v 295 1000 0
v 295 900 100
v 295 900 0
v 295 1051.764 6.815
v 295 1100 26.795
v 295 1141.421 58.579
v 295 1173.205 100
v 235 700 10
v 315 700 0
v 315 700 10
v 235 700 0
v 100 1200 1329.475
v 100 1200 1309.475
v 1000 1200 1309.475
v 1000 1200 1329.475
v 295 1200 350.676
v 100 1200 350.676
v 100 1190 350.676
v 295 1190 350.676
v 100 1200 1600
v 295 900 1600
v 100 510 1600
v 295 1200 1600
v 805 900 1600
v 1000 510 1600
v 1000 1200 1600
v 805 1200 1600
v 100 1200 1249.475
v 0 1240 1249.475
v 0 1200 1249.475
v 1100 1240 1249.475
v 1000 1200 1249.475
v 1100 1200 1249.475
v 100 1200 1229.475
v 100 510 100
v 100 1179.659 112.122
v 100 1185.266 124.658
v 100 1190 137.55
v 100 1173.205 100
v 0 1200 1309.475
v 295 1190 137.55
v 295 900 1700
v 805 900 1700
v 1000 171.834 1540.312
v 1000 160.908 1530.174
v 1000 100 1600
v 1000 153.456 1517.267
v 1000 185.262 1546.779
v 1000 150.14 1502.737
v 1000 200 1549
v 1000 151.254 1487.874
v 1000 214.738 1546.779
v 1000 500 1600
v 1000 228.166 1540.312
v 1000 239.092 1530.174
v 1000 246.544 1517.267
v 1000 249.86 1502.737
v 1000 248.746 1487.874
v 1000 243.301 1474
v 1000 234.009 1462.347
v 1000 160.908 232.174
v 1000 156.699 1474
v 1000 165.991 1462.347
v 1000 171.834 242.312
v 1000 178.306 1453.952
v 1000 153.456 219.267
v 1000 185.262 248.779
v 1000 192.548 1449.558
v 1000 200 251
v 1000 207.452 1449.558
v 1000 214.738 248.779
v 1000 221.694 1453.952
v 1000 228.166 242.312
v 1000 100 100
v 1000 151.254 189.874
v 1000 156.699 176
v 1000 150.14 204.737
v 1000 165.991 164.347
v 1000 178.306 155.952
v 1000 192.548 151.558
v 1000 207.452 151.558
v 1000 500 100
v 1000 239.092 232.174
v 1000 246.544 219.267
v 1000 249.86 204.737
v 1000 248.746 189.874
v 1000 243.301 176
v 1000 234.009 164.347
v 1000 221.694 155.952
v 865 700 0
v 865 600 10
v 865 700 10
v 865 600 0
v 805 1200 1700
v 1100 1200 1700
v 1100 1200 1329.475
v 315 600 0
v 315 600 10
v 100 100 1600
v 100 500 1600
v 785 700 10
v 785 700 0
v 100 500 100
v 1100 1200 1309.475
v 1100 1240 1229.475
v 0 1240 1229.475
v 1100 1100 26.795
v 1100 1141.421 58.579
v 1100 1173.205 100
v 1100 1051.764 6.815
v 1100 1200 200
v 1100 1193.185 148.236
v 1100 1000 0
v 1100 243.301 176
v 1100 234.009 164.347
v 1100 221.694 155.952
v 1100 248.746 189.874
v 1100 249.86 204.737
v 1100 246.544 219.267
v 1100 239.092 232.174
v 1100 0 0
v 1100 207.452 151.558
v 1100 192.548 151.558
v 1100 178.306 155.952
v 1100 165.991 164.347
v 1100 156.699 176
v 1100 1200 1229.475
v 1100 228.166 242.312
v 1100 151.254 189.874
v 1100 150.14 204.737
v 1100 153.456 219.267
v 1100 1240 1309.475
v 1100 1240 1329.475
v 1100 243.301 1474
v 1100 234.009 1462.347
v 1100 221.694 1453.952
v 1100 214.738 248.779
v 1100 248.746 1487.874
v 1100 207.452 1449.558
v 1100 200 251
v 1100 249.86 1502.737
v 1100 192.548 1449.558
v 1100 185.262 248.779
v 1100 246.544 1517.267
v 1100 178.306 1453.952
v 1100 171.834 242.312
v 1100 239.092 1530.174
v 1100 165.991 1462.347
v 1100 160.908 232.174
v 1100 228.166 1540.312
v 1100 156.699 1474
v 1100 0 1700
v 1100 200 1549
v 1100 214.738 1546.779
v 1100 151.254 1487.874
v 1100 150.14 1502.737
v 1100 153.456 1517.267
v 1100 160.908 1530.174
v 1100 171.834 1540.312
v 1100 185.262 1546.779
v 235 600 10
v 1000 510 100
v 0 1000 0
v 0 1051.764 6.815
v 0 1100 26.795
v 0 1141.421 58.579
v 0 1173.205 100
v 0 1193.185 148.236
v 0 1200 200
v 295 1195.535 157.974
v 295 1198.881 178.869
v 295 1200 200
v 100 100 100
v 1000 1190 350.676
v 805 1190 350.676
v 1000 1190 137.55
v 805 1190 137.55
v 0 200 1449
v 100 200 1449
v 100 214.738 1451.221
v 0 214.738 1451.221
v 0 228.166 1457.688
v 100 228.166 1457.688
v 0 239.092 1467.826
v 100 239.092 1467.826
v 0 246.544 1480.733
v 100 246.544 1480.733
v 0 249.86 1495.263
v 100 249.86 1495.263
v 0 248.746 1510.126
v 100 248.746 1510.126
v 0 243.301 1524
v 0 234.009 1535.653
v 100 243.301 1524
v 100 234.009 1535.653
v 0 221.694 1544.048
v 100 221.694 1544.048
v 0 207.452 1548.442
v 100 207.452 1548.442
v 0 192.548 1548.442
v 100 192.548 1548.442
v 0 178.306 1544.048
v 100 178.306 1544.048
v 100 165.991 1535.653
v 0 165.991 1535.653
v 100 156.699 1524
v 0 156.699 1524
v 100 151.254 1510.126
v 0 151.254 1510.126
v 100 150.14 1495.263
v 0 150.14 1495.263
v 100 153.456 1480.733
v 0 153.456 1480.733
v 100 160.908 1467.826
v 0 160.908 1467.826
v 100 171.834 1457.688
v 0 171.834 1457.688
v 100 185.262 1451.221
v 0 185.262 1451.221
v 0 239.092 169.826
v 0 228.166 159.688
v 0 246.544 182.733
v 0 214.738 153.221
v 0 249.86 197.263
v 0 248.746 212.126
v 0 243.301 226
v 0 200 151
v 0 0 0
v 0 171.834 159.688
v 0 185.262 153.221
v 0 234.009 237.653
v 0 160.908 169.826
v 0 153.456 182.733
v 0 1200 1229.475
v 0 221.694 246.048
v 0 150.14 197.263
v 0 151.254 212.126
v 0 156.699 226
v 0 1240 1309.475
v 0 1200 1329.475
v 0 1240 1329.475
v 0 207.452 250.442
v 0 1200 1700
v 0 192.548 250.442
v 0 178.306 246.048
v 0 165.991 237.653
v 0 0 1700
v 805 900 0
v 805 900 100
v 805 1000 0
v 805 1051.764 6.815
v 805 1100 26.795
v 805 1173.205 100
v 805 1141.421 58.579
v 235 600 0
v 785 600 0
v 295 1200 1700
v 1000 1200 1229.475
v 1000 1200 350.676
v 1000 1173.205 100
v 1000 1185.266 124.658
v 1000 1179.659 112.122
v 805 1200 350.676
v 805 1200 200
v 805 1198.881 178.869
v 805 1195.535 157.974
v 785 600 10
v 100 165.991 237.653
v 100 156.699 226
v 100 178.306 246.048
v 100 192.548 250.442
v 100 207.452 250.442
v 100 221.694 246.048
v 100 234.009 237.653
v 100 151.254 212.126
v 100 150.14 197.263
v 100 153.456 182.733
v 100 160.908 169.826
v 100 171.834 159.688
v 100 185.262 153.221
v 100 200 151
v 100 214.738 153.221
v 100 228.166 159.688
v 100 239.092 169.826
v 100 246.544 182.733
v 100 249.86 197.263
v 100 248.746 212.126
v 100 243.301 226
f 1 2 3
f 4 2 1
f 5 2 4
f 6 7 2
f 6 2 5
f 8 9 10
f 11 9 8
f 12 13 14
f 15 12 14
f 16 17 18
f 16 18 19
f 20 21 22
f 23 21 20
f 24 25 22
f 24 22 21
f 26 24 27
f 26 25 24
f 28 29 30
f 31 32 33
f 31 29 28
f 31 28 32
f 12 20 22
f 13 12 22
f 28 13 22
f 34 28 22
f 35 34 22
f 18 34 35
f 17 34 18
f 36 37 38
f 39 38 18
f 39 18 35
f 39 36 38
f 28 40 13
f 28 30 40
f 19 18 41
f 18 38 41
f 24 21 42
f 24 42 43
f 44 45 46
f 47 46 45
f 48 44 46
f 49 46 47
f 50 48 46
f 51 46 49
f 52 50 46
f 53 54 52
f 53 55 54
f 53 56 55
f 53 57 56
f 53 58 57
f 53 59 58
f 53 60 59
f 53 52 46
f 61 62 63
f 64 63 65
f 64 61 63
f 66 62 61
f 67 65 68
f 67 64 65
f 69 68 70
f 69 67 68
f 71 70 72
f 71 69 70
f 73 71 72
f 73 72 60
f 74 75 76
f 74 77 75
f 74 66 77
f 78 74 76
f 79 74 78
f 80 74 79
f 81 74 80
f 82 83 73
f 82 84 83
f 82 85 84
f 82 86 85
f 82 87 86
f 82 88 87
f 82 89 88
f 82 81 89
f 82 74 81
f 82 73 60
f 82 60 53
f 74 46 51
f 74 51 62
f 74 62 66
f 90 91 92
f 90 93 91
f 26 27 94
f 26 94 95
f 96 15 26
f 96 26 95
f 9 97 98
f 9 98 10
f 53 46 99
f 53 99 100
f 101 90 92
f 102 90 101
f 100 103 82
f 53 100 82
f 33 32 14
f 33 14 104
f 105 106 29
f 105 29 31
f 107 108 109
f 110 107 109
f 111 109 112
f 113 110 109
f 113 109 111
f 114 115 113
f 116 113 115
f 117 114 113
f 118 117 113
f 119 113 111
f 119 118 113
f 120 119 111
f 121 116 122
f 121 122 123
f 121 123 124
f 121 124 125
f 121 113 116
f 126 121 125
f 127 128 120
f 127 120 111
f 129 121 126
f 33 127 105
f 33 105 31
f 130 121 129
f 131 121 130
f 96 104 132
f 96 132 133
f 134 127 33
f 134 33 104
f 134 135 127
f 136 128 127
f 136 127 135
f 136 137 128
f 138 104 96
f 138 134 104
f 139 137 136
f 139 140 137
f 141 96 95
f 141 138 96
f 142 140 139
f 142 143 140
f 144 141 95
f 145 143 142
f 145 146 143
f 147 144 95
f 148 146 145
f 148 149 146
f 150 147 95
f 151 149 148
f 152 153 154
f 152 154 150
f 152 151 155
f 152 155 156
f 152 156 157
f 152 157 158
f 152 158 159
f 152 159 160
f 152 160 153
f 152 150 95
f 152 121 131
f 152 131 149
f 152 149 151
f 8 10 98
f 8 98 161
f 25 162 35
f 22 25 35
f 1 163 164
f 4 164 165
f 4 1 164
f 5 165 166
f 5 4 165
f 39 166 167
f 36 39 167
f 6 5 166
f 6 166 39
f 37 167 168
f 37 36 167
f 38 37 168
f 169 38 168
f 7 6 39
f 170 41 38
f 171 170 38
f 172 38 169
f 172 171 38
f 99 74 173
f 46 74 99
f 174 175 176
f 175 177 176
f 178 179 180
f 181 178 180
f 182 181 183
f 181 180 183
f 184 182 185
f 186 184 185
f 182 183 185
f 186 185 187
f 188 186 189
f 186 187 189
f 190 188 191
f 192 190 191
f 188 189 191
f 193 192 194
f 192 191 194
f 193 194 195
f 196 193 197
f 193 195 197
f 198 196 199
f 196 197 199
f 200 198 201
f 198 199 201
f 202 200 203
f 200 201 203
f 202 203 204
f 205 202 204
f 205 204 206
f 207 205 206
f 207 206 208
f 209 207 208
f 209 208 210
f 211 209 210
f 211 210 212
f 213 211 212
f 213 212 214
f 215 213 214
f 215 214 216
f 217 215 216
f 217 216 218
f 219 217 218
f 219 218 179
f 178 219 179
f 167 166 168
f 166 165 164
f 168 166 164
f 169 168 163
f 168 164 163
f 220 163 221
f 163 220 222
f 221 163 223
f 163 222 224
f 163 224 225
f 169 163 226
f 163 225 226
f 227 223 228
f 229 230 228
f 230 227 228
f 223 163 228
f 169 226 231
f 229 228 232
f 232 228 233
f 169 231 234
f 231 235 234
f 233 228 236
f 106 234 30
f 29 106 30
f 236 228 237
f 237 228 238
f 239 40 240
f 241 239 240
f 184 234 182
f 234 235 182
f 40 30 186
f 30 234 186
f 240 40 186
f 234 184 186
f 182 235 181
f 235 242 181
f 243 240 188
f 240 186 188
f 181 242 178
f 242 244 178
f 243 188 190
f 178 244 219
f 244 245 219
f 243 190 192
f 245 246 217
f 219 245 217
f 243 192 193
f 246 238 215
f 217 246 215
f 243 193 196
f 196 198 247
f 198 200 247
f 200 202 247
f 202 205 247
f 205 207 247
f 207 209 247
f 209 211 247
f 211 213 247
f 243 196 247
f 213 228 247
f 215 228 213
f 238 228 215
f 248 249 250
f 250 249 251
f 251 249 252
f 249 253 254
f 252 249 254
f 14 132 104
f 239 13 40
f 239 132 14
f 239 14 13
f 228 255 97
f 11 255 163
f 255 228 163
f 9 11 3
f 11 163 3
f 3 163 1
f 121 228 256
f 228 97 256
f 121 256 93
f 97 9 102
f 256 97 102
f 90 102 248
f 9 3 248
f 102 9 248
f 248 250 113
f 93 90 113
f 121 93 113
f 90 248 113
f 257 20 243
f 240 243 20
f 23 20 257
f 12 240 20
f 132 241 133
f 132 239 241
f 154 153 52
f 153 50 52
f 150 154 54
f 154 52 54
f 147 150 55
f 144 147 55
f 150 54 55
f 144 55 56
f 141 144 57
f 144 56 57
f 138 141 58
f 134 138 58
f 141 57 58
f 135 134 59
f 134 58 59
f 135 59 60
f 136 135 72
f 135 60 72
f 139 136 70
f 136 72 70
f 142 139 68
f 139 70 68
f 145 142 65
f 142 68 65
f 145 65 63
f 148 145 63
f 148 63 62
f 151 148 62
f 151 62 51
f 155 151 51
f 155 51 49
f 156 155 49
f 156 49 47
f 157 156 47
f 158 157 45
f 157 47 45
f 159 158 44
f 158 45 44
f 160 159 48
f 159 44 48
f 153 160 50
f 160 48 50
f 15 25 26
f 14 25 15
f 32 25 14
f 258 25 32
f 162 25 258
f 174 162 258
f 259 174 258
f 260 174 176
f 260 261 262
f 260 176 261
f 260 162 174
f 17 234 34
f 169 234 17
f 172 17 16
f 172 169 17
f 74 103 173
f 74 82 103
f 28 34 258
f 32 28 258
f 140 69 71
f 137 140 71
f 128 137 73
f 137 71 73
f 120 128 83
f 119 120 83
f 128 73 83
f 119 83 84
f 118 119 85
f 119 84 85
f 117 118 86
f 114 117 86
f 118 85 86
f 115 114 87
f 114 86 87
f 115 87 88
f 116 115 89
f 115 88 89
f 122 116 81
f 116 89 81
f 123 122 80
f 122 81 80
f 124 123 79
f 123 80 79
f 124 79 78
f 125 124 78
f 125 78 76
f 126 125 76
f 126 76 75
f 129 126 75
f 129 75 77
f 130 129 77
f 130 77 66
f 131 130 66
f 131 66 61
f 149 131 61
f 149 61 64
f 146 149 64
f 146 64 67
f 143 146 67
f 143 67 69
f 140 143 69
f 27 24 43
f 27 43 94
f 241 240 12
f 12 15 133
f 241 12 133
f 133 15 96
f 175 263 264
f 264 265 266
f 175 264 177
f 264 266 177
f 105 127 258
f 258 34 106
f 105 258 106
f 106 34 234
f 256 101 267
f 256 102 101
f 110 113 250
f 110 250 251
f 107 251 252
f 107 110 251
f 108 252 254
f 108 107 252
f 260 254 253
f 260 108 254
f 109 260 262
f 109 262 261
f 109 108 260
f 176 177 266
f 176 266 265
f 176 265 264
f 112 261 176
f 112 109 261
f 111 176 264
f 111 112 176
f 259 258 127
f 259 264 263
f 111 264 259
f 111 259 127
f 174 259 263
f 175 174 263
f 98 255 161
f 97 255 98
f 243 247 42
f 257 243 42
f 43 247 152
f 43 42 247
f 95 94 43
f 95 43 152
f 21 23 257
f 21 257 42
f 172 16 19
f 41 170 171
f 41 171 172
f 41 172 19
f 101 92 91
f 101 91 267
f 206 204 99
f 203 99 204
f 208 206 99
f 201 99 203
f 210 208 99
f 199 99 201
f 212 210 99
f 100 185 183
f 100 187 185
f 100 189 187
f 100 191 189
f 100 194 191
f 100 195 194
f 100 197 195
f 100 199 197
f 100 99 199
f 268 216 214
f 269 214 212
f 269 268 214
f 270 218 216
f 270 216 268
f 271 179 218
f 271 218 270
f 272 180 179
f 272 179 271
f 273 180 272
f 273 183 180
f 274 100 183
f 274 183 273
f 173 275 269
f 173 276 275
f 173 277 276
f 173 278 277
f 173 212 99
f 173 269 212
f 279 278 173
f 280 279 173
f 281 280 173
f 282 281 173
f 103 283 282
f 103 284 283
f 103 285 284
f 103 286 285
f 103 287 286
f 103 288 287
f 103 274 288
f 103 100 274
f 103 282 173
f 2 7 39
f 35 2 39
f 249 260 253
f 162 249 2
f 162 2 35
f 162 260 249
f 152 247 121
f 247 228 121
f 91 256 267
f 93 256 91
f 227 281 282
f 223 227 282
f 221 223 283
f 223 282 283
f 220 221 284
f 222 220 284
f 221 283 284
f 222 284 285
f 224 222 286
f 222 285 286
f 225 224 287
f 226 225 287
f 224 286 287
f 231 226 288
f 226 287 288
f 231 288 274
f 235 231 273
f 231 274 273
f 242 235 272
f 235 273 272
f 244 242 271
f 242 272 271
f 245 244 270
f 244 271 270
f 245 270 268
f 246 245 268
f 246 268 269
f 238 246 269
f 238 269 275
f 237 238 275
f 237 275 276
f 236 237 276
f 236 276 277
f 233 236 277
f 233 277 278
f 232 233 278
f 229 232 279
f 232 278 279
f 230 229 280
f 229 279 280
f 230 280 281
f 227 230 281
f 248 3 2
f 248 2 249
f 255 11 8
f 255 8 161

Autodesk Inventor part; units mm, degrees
ref_plane "YZ Plane" through (0, 0, 0) normal (1, 0, 0) x (0, 1, 0)
ref_plane "XZ Plane" through (0, 0, 0) normal (0, 1, 0) x (-1, 0, 0)
ref_plane "XY Plane" through (0, 0, 0) normal (0, 0, 1) x (1, 0, 0)
sketch "Sketch10" plane through (0, 0, 0) normal (0, 1, 0) x (-1, 0, 0)
  point P0 (0, 0)
sketch "Sketch11" plane through (0, 0, 0) normal (0, 0, 1) x (1, 0, 0)
  point P0 (0, 0)
sketch "Sketch12" plane through (0, 0, 0) normal (0, 0, 1) x (1, 0, 0)
  line L0 (0, 0) -> (1100, 0)
  line L1 (1100, 0) -> (1100, 1200)
  line L2 (1100, 1200) -> (0, 1200)
  line L3 (0, 1200) -> (0, 0)
  dimension "d20" = 1100
  dimension "d21" = 1200
extrude "Extrusion6" add sketch "Sketch12" along normal blind 1700
sketch "Sketch13" plane through (1100, 0, 0) normal (1, 0, 0) x (0, 0, -1)
  line L0 (-100, 100) -> (-1600, 100)
  line L1 (-1600, 100) -> (-1600, 1200)
  line L2 (-1600, 1200) -> (-100, 1200)
  line L3 (-100, 1200) -> (-100, 100)
  point P0 (0, 0)
  dimension "d24" = 1500
extrude "Extrusion7" cut sketch "Sketch13" against normal blind 1000
sketch "Sketch16" plane through (100, 0, 0) normal (1, 0, 0) x (0, 0, -1)
  circle A0 centre (-1499, 200) radius 50
  circle A1 centre (-201, 200) radius 50
  point P0 (0, 0)
  dimension "d34" = 100
  dimension "d35" = 100
extrude "Extrusion10" cut sketch "Sketch16" along normal blind 1200 and the other way blind 200
sketch "Sketch18" plane through (1100, 100, 100) normal (0, 0, 1) x (1, 0, 0)
  line L0 (0, 0) -> (-1000, 0) projected
  line L1 (-1000, 1100) -> (0, 1100) projected
  line L2 (0, 0) -> (-100, 0)
  line L3 (-100, 0) -> (-100, 1100)
  line L4 (-100, 1100) -> (0, 1100)
  line L5 (0, 1100) -> (0, 0)
  point P0 (-1100, -100)
  dimension "d43" = 100
extrude "Extrusion12" add sketch "Sketch18" along normal blind 1500
sketch "Sketch19" plane through (0, 0, 1700) normal (0, 0, 1) x (1, 0, 0)
  line L0 (100, 500) -> (1000, 500)
  line L1 (1000, 500) -> (1000, 510)
  line L2 (1000, 510) -> (100, 510)
  line L3 (100, 510) -> (100, 500)
  point P0 (0, 0)
  dimension "d46" = 900
  dimension "d47" = 10
extrude "Extrusion13" add sketch "Sketch19" against normal blind 1700
sketch "Sketch20" plane through (0, 0, 0) normal (0, 0, -1) x (-1, 0, 0)
  line L0 (-805, 1200) -> (-295, 1200)
  line L1 (-295, 1200) -> (-295, 900)
  line L2 (-295, 900) -> (-805, 900)
  line L3 (-805, 900) -> (-805, 1200)
  point P0 (0, 0)
  dimension "d58" = 510
  dimension "d59" = 300
extrude "Extrusion14" cut sketch "Sketch20" against normal blind 1700
sketch "Sketch21" plane through (1100, 1200, 1700) normal (0, 1, 0) x (1, 0, 0)
  line L0 (0, 1700) -> (0, 0) projected
  line L1 (-1100, 1700) -> (-1100, 0) projected
  line L2 (0, 470.5254) -> (-1100, 470.5254)
  line L3 (-1100, 470.5254) -> (-1100, 370.5254)
  line L4 (-1100, 370.5254) -> (0, 370.5254)
  line L5 (0, 370.5254) -> (0, 470.5254)
  dimension "d60" = 100
extrude "Extrusion15" add sketch "Sketch21" along normal blind 40
sketch "Sketch22" plane through (1100, 1240, 1700) normal (0, 1, 0) x (1, 0, 0)
  line L0 (-1100, 470.5254) -> (-1100, 370.5254) projected
  line L1 (0, 370.5254) -> (0, 470.5254) projected
  line L2 (-1100, 450.525) -> (0, 450.525)
  line L3 (0, 450.525) -> (0, 390.525)
  line L4 (0, 390.525) -> (-1100, 390.525)
  line L5 (-1100, 390.525) -> (-1100, 450.525)
  point P0 (-1100, 1700)
  dimension "d63" = 60
extrude "Extrusion16" cut sketch "Sketch22" against normal blind 40
sketch "Sketch23" plane through (1100, 1240, 1700) normal (0, 1, 0) x (1, 0, 0)
  point P0 (-1100, 1700)
sketch "Sketch25" plane through (1100, 0, 0) normal (1, 0, 0) x (0, 0, -1)
  point P0 (0, 0)
sketch "Sketch27" plane through (0, 0, 0) normal (0, 0, -1) x (-1, 0, 0)
  line L0 (-865, 700) -> (-785, 700)
  line L1 (-785, 700) -> (-785, 600)
  line L2 (-785, 600) -> (-865, 600)
  line L3 (-865, 600) -> (-865, 700)
  line L4 (0, 0) -> (-1100, 0) projected
  line L5 (-1100, 0) -> (-1100, 1200) projected
  line L6 (-805, 900) -> (-805, 1200) projected
  line L7 (-315, 700) -> (-235, 700)
  line L8 (-235, 700) -> (-235, 600)
  line L9 (-235, 600) -> (-315, 600)
  line L10 (-315, 600) -> (-315, 700)
  line L11 (-295, 1200) -> (-295, 900) projected
  dimension "d77" = 100
  dimension "d78" = 80
  dimension "d79" = 600
  dimension "d81" = 20
  dimension "d82" = 100
  dimension "d83" = 80
  dimension "d84" = 600
  dimension "d85" = 20
extrude "Extrusion17" cut sketch "Sketch27" against normal blind 10
sketch "Sketch28" plane through (0, 1200, 1229.4746) normal (0, 1, 0) x (1, 0, 0)
  line L0 (100, 0) -> (100, 1129.4746) projected
  line L1 (295, 1129.4746) -> (100, 1129.4746)
  line L2 (100, 1129.4746) -> (100, 878.7986)
  line L3 (100, 878.7986) -> (295, 878.7986)
  line L4 (295, 878.7986) -> (295, 1129.4746)
  point P0 (0, 1229.4746)
  point P1 (100, 1029.4746)
  dimension "d90" = 250.676
extrude "Extrusion18" add sketch "Sketch28" against normal blind 10
sketch "Sketch29" plane through (805, 1200, 0) normal (0, 1, 0) x (1, 0, 0)
  line L0 (0, 0) -> (0, -100) projected
  line L1 (195, -100) -> (195, -1229.4746) projected
  line L2 (0, -100) -> (195, -100)
  line L3 (195, -100) -> (195, -350.676)
  line L4 (195, -350.676) -> (0, -350.676)
  line L5 (0, -350.676) -> (0, -100)
  point P0 (-805, 0)
  dimension "d93" = 250.676
extrude "Extrusion19" add sketch "Sketch29" against normal blind 10
sketch "Sketch30" plane through (0, 1200, 0) normal (0, 1, 0) x (1, 0, 0)
  point P0 (0, 0)
fillet "Fillet3" radius 200 2 edges at (952.5, 1200, 0) (147.5, 1200, 0)
sketch "Sketch31" plane through (0, 0, 1700) normal (-1, 0, 0) x (0, 0, 1)
  circle A0 centre (-1499, 200) radius 50 projected
  circle A1 centre (-1499, 200) radius 50
  point P0 (-1700, 0)
extrude "Extrusion20" cut sketch "Sketch31" against normal blind 10000
sketch "Sketch32" plane through (0, 0, 1700) normal (-1, 0, 0) x (0, 0, 1)
  circle A0 centre (-201, 200) radius 50 projected
  circle A1 centre (-201, 200) radius 50
  point P0 (-1700, 0)
extrude "Extrusion21" cut sketch "Sketch32" against normal blind 10000
properties part number "Design" material "Copper"
